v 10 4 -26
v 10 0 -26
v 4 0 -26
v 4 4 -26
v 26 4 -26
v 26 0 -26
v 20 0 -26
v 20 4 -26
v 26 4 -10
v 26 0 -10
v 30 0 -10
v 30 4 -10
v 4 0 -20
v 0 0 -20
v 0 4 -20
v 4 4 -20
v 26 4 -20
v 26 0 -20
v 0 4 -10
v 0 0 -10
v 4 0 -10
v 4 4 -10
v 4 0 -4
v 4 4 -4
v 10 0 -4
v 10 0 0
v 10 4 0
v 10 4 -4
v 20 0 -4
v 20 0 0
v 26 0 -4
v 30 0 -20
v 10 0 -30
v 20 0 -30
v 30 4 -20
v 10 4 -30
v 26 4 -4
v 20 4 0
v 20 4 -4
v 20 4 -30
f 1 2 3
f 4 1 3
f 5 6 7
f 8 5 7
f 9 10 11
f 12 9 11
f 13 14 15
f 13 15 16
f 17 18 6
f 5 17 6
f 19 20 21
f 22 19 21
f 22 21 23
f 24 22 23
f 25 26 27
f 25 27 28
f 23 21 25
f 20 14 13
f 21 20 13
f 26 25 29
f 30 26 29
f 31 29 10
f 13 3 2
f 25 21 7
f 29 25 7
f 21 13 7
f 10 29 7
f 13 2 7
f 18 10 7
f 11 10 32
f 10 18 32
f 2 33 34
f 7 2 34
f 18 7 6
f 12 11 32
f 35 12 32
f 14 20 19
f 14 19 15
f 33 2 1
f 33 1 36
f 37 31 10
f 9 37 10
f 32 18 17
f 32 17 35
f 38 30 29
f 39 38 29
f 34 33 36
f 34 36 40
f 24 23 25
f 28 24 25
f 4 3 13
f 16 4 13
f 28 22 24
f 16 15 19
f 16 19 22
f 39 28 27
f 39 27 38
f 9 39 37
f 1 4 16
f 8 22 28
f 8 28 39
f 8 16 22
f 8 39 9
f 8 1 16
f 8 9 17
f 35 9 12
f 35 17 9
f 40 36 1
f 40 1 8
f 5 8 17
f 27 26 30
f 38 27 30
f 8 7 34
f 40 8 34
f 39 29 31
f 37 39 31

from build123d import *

# Parameters (mm, degrees)
SKETCH1_W           = 10
SKETCH1_H           = 4
SKETCH1_W_2         = 4
SKETCH1_H_2         = 10
BOSS_EXTRUDE1_DEPTH = 4


with BuildPart() as part:
    # Sketch1 → Boss-Extrude1 (new body)
    with BuildSketch(Plane(origin=(0, 0, 0), x_dir=(1, 0, 0), z_dir=(0, 1, 0))):
        Polygon((4, 10), (4, 4), (10, 4), (20, 4), (26, 4), (26, 10), (26, 20), (26, 26), (20, 26), (10, 26), (4, 26), (4, 20), align=None)
        with Locations((15, 2)):
            Rectangle(SKETCH1_W, SKETCH1_H)
        with Locations((28, 15)):
            Rectangle(SKETCH1_W_2, SKETCH1_H_2)
        with Locations((15, 28)):
            Rectangle(SKETCH1_W, SKETCH1_H)
        with Locations((2, 15)):
            Rectangle(SKETCH1_W_2, SKETCH1_H_2)
    extrude(amount=BOSS_EXTRUDE1_DEPTH)


solid = part.part
